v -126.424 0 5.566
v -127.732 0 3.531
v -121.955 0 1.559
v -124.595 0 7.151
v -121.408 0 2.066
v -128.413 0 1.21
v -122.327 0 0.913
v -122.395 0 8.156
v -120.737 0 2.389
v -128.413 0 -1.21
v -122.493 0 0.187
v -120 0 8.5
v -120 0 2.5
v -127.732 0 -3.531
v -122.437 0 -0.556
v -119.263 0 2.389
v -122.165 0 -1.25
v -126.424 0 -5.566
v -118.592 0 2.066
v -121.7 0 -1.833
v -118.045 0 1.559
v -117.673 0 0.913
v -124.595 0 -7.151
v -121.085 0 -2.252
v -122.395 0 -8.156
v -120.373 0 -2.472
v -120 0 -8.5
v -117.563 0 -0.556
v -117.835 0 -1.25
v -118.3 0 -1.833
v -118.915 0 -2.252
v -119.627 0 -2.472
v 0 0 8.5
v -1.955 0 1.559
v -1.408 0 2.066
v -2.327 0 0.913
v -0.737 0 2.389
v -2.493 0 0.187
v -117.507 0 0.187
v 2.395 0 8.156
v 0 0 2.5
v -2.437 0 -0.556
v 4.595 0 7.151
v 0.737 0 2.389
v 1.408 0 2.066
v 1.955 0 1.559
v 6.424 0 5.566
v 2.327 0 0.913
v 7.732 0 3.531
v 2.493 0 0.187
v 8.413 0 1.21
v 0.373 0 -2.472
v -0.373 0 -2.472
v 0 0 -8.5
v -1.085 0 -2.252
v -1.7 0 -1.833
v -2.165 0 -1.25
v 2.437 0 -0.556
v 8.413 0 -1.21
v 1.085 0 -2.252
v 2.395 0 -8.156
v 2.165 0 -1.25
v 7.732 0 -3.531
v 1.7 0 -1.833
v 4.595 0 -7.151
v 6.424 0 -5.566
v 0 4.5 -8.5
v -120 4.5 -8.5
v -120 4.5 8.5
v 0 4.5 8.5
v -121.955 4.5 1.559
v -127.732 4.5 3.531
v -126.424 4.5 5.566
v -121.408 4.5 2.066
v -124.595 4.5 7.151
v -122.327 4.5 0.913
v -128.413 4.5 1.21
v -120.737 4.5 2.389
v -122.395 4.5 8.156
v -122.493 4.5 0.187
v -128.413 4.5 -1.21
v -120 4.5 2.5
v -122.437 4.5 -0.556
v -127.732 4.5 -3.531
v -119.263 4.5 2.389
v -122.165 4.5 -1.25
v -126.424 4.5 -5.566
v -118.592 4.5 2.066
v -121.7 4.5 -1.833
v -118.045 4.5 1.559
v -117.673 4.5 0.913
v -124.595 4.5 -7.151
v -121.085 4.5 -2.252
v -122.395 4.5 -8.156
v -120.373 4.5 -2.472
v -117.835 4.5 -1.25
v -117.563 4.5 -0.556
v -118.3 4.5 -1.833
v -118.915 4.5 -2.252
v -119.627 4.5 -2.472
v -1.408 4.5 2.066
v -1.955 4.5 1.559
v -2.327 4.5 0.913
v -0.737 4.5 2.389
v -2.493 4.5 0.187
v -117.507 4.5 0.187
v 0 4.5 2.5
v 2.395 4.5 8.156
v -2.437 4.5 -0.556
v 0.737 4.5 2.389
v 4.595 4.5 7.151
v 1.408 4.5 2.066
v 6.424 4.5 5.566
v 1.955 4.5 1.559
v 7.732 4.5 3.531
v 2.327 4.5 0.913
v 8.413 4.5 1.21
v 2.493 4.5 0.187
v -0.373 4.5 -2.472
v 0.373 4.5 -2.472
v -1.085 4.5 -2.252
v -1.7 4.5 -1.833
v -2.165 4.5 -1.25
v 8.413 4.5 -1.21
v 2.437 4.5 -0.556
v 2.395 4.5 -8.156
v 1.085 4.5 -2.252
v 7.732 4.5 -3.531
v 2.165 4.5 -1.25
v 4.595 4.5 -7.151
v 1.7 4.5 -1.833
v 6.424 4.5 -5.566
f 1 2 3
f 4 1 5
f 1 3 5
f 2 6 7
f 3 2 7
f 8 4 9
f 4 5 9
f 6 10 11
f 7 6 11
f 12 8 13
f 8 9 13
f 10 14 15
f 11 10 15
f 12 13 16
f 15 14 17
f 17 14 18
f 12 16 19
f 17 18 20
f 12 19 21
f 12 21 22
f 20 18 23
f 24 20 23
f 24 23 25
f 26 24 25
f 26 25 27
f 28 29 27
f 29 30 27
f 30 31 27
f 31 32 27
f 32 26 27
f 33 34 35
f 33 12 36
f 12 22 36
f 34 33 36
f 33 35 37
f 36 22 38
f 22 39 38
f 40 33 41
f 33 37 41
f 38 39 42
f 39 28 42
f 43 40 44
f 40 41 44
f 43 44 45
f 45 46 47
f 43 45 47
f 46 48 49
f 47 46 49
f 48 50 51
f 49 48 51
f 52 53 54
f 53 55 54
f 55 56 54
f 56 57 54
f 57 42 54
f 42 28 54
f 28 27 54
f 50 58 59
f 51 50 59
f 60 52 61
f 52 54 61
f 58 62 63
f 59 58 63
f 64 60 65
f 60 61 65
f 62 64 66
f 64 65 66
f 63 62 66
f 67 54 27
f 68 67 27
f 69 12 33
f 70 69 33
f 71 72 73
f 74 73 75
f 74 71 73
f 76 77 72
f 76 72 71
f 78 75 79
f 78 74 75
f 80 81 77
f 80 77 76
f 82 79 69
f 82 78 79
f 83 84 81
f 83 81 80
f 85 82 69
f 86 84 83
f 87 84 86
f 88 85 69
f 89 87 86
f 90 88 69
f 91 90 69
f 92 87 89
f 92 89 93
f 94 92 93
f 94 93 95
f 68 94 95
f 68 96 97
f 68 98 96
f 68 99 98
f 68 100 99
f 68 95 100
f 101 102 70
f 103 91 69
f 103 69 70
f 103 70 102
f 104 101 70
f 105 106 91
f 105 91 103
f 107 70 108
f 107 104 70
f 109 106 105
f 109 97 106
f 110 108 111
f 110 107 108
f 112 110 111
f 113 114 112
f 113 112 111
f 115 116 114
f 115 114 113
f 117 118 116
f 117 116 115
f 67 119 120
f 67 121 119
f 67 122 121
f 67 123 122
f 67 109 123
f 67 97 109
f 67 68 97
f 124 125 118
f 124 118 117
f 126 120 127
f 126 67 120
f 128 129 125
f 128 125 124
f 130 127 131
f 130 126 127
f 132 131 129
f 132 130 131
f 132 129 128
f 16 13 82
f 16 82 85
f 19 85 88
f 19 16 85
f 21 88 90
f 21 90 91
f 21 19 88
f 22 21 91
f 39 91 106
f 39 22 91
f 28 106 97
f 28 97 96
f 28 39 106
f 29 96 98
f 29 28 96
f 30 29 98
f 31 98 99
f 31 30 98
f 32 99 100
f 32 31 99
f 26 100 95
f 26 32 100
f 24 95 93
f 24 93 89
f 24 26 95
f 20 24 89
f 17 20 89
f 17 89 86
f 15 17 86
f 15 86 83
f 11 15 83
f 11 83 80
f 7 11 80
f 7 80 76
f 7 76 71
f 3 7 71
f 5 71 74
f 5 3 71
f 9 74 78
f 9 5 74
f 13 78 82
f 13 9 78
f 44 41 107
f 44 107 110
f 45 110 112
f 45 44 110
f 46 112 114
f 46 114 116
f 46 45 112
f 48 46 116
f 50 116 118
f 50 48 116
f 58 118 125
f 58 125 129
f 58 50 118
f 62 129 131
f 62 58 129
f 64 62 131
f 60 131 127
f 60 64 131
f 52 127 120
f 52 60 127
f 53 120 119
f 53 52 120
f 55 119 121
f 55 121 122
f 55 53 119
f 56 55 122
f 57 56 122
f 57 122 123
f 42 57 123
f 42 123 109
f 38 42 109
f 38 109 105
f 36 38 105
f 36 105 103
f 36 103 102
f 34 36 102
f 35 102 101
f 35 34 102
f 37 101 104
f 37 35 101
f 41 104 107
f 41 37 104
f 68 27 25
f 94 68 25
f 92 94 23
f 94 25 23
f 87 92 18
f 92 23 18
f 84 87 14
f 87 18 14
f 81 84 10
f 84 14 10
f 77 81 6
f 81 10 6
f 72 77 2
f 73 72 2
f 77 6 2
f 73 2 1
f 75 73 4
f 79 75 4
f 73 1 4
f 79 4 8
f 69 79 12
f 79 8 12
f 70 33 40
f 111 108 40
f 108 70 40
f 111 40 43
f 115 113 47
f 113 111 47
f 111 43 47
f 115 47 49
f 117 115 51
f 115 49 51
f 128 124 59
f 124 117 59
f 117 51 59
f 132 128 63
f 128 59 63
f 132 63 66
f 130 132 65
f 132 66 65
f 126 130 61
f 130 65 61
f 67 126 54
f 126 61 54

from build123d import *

# Parameters (mm, degrees)
SKETCH1_R           = 8.5
SKETCH1_R_2         = 2.5
BOSS_EXTRUDE2_DEPTH = 4.5


with BuildPart() as part:
    # Sketch1 → Boss-Extrude2 (new body)
    # profile 1 of 3: a face of its own
    with BuildSketch(Plane(origin=(0, 0, 0), x_dir=(1, 0, 0), z_dir=(0, 1, 0))):
        with BuildLine():
            Line((0, 8.5), (-120, 8.5))
            ThreePointArc((-120, 8.5), (-113.98959236, 6.01040764), (-111.5, 0))
            ThreePointArc((-111.5, 0), (-113.98959236, -6.01040764), (-120, -8.5))
            Line((-120, -8.5), (0, -8.5))
            ThreePointArc((0, -8.5), (-8.5, 0), (0, 8.5))
        make_face()
    # profile 2 of 3: a face of its own
    with BuildSketch(Plane(origin=(0, 0, 0), x_dir=(1, 0, 0), z_dir=(0, 1, 0))):
        with Locations((-120, 0)):
            Circle(SKETCH1_R)
        with Locations(Location((-120, 0, 0), (0, 0, 270))):
            Circle(SKETCH1_R_2, mode=Mode.SUBTRACT)
    # profile 3 of 3: a face of its own
    with BuildSketch(Plane(origin=(0, 0, 0), x_dir=(1, 0, 0), z_dir=(0, 1, 0))):
        Circle(SKETCH1_R)
        with Locations(Location((0, 0, 0), (0, 0, 270))):
            Circle(SKETCH1_R_2, mode=Mode.SUBTRACT)
    extrude(amount=BOSS_EXTRUDE2_DEPTH)


solid = part.part
